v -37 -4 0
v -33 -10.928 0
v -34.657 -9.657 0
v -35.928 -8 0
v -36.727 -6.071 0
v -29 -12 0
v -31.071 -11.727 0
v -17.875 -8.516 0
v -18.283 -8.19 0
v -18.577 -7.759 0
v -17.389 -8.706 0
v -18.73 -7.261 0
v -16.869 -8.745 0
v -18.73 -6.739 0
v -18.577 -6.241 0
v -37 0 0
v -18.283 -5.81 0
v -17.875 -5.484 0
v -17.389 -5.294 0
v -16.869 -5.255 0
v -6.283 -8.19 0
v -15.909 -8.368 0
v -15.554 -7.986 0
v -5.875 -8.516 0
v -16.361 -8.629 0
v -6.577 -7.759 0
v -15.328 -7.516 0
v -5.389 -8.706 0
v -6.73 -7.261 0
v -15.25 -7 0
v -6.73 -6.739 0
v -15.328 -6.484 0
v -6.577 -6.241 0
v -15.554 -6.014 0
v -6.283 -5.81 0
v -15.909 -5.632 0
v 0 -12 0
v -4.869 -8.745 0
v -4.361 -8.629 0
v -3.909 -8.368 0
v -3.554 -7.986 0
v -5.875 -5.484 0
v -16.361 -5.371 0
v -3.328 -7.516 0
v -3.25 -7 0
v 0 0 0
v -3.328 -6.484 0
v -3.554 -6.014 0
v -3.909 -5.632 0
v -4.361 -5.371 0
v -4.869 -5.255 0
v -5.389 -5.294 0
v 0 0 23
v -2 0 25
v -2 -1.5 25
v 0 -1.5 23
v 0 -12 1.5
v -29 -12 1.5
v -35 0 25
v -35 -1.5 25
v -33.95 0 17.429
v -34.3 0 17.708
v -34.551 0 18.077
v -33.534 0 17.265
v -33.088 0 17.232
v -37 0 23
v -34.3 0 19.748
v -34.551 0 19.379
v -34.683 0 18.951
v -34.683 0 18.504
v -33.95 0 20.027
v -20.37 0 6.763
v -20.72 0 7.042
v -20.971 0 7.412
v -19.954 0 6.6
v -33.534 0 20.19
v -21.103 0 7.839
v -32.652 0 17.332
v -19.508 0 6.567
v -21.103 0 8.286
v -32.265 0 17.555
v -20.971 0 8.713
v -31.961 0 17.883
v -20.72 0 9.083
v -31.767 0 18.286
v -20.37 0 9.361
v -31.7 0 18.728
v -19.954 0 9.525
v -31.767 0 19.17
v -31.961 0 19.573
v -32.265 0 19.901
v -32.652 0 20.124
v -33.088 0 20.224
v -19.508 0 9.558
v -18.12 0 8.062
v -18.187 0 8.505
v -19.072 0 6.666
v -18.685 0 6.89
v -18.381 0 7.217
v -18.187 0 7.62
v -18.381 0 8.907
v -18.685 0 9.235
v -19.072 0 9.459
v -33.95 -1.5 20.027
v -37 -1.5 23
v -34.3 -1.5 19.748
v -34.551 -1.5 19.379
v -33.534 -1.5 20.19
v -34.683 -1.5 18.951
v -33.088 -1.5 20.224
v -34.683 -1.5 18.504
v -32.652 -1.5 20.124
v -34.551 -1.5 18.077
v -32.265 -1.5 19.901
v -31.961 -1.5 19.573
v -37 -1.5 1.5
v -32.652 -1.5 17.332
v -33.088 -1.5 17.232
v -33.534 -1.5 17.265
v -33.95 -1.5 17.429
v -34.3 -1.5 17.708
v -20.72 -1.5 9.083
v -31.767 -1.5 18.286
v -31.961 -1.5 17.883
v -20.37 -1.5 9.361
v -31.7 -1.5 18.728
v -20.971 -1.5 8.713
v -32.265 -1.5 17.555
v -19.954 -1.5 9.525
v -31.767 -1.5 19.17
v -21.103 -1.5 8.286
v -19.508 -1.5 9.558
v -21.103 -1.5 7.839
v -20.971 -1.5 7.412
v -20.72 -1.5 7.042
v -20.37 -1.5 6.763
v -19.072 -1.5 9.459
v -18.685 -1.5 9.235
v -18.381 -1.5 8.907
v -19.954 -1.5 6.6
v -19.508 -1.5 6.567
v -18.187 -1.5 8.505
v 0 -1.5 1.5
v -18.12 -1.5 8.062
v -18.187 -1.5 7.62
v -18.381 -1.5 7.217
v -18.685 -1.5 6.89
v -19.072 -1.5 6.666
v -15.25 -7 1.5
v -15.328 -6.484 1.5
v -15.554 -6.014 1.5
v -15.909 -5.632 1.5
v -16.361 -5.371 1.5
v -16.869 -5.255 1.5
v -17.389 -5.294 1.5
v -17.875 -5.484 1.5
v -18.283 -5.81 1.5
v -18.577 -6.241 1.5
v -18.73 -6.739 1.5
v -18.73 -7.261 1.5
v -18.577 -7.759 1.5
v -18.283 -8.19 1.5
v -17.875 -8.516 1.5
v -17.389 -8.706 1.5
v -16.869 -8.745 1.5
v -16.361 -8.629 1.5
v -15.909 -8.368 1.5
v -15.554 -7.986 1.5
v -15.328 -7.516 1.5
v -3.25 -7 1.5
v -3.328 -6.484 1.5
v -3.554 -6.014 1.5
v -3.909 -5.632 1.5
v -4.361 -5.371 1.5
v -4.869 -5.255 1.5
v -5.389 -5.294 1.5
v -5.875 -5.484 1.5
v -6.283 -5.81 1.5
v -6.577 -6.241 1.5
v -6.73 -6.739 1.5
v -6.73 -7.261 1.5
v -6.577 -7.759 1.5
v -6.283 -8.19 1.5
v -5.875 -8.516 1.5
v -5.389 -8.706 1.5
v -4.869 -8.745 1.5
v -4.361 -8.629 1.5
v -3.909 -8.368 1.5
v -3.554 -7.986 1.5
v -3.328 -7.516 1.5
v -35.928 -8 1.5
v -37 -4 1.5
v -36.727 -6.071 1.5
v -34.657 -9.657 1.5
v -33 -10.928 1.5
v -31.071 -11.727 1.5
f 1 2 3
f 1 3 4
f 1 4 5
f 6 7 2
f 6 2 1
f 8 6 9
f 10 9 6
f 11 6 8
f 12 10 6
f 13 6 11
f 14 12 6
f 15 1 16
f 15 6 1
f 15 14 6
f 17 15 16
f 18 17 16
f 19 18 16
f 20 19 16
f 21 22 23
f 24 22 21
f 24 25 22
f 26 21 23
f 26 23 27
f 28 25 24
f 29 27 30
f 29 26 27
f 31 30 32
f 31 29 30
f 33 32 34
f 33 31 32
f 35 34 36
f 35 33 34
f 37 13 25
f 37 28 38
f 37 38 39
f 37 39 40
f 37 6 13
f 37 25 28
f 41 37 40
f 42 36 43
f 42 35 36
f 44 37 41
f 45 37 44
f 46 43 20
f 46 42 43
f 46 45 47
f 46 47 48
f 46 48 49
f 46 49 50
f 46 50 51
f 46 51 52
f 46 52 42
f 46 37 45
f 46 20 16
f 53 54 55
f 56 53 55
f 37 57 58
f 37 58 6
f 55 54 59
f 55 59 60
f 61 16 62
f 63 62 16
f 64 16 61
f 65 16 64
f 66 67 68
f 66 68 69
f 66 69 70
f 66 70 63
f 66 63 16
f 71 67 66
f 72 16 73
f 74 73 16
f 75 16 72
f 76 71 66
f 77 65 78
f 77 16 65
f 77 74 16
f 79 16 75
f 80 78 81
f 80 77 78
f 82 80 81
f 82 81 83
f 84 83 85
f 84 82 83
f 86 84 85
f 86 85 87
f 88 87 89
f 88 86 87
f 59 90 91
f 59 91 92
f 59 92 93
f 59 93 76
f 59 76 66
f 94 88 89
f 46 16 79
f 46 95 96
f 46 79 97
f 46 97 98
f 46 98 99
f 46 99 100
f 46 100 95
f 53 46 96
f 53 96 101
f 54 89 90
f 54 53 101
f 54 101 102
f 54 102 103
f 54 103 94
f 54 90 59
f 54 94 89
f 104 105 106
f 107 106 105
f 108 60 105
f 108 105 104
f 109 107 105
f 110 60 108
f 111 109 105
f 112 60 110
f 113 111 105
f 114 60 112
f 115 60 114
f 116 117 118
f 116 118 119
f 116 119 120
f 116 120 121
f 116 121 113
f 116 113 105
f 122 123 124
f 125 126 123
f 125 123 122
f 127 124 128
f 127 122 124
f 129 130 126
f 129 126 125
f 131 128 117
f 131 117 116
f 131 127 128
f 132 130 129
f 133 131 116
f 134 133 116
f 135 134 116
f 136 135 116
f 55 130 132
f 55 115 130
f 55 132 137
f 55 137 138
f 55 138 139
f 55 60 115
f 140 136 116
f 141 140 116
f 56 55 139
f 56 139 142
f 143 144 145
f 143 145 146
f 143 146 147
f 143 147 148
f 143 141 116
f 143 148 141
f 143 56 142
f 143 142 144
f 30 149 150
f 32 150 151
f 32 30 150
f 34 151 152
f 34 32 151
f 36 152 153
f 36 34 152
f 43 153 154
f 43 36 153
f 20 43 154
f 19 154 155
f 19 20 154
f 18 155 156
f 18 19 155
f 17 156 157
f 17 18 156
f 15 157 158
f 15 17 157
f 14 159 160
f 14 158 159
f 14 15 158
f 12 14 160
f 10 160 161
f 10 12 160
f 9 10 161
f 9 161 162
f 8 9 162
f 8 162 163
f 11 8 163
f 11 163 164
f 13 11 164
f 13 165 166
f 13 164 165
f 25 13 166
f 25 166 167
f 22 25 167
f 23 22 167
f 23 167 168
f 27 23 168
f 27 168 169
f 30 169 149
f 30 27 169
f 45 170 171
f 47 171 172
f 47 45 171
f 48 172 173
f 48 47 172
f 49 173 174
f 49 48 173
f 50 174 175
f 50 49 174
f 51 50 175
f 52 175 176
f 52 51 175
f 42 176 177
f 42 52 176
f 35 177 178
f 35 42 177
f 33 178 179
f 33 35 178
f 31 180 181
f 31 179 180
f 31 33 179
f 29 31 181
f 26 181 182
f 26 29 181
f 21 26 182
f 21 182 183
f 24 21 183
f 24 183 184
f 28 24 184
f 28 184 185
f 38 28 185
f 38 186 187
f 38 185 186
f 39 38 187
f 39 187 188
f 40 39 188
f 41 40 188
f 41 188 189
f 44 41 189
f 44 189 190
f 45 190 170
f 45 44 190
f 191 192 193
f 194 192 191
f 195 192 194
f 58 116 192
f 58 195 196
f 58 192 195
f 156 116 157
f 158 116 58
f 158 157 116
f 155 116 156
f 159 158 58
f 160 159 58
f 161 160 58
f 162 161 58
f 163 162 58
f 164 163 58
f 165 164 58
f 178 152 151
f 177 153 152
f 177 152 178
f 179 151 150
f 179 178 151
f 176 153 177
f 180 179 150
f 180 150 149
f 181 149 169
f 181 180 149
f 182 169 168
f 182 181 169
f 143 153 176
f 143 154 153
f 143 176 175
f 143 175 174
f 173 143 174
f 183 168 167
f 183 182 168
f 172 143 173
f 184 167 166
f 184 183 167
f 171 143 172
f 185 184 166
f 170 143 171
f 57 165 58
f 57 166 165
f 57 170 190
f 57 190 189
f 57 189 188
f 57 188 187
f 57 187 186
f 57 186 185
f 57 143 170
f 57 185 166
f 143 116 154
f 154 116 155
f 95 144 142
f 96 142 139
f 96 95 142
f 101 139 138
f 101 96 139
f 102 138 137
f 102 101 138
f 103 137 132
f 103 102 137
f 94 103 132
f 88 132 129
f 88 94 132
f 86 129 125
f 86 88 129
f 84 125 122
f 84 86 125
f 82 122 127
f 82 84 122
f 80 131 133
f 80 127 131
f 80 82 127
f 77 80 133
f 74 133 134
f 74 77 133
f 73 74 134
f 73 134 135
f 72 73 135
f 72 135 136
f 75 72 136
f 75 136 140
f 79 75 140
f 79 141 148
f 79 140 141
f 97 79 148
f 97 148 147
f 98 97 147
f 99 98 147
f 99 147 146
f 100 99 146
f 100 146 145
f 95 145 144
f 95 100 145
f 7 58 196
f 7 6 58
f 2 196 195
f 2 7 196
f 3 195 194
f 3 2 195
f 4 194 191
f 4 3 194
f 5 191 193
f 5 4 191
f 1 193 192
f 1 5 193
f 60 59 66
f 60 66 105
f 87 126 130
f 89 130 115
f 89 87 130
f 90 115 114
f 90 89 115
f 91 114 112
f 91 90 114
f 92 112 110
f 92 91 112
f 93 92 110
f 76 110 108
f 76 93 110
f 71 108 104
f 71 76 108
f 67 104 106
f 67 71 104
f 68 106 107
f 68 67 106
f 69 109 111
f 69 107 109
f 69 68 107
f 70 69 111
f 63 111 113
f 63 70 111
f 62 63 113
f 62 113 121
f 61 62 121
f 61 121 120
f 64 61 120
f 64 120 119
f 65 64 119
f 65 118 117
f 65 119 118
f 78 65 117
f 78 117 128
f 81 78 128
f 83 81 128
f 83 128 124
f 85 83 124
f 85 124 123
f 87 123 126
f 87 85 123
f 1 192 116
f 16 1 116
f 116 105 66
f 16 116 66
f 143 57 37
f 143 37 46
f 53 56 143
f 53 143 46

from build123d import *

# Parameters (mm, degrees)
F1_DEPTH = 37
F2_R     = 1.5
F3_DEPTH = 12.001
F4_R     = 1.75
F5_DEPTH = 25.001
F6_R     = 8
F7_SIZE  = 2


with BuildPart() as f1:
    # F0 (on Right) → F1 (new body)
    with BuildSketch(Plane.YZ):
        Polygon((-12, 0), (0, 0), (0, 25), (-1.5, 25), (-1.5, 1.5), (-12, 1.5), align=None)
    extrude(amount=-F1_DEPTH)

    # F2 (on Front) → F3 (cut, through all)
    with BuildSketch(Plane.XZ):
        with Locations((-33.2, 18.727851)):
            Circle(F2_R)
        with Locations((-19.62, 8.062404)):
            Circle(F2_R)
    extrude(amount=F3_DEPTH, mode=Mode.SUBTRACT)

    # F4 (on Top) → F5 (cut, through all)
    with BuildSketch(Plane.XY):
        with Locations((-5, -7)):
            Circle(F4_R)
        with Locations((-17, -7)):
            Circle(F4_R)
    extrude(amount=F5_DEPTH, mode=Mode.SUBTRACT)

    # F6
    f6_edges = [f1.edges().sort_by_distance(p)[0] for p in [
        (-37, -12, 0.75),
    ]]
    fillet(f6_edges, radius=F6_R)

    # F7
    f7_edges = [f1.edges().sort_by_distance(p)[0] for p in [
        (-37, -0.75, 25),
        (0, -0.75, 25),
    ]]
    chamfer(f7_edges, length=F7_SIZE)


solid = f1.part
